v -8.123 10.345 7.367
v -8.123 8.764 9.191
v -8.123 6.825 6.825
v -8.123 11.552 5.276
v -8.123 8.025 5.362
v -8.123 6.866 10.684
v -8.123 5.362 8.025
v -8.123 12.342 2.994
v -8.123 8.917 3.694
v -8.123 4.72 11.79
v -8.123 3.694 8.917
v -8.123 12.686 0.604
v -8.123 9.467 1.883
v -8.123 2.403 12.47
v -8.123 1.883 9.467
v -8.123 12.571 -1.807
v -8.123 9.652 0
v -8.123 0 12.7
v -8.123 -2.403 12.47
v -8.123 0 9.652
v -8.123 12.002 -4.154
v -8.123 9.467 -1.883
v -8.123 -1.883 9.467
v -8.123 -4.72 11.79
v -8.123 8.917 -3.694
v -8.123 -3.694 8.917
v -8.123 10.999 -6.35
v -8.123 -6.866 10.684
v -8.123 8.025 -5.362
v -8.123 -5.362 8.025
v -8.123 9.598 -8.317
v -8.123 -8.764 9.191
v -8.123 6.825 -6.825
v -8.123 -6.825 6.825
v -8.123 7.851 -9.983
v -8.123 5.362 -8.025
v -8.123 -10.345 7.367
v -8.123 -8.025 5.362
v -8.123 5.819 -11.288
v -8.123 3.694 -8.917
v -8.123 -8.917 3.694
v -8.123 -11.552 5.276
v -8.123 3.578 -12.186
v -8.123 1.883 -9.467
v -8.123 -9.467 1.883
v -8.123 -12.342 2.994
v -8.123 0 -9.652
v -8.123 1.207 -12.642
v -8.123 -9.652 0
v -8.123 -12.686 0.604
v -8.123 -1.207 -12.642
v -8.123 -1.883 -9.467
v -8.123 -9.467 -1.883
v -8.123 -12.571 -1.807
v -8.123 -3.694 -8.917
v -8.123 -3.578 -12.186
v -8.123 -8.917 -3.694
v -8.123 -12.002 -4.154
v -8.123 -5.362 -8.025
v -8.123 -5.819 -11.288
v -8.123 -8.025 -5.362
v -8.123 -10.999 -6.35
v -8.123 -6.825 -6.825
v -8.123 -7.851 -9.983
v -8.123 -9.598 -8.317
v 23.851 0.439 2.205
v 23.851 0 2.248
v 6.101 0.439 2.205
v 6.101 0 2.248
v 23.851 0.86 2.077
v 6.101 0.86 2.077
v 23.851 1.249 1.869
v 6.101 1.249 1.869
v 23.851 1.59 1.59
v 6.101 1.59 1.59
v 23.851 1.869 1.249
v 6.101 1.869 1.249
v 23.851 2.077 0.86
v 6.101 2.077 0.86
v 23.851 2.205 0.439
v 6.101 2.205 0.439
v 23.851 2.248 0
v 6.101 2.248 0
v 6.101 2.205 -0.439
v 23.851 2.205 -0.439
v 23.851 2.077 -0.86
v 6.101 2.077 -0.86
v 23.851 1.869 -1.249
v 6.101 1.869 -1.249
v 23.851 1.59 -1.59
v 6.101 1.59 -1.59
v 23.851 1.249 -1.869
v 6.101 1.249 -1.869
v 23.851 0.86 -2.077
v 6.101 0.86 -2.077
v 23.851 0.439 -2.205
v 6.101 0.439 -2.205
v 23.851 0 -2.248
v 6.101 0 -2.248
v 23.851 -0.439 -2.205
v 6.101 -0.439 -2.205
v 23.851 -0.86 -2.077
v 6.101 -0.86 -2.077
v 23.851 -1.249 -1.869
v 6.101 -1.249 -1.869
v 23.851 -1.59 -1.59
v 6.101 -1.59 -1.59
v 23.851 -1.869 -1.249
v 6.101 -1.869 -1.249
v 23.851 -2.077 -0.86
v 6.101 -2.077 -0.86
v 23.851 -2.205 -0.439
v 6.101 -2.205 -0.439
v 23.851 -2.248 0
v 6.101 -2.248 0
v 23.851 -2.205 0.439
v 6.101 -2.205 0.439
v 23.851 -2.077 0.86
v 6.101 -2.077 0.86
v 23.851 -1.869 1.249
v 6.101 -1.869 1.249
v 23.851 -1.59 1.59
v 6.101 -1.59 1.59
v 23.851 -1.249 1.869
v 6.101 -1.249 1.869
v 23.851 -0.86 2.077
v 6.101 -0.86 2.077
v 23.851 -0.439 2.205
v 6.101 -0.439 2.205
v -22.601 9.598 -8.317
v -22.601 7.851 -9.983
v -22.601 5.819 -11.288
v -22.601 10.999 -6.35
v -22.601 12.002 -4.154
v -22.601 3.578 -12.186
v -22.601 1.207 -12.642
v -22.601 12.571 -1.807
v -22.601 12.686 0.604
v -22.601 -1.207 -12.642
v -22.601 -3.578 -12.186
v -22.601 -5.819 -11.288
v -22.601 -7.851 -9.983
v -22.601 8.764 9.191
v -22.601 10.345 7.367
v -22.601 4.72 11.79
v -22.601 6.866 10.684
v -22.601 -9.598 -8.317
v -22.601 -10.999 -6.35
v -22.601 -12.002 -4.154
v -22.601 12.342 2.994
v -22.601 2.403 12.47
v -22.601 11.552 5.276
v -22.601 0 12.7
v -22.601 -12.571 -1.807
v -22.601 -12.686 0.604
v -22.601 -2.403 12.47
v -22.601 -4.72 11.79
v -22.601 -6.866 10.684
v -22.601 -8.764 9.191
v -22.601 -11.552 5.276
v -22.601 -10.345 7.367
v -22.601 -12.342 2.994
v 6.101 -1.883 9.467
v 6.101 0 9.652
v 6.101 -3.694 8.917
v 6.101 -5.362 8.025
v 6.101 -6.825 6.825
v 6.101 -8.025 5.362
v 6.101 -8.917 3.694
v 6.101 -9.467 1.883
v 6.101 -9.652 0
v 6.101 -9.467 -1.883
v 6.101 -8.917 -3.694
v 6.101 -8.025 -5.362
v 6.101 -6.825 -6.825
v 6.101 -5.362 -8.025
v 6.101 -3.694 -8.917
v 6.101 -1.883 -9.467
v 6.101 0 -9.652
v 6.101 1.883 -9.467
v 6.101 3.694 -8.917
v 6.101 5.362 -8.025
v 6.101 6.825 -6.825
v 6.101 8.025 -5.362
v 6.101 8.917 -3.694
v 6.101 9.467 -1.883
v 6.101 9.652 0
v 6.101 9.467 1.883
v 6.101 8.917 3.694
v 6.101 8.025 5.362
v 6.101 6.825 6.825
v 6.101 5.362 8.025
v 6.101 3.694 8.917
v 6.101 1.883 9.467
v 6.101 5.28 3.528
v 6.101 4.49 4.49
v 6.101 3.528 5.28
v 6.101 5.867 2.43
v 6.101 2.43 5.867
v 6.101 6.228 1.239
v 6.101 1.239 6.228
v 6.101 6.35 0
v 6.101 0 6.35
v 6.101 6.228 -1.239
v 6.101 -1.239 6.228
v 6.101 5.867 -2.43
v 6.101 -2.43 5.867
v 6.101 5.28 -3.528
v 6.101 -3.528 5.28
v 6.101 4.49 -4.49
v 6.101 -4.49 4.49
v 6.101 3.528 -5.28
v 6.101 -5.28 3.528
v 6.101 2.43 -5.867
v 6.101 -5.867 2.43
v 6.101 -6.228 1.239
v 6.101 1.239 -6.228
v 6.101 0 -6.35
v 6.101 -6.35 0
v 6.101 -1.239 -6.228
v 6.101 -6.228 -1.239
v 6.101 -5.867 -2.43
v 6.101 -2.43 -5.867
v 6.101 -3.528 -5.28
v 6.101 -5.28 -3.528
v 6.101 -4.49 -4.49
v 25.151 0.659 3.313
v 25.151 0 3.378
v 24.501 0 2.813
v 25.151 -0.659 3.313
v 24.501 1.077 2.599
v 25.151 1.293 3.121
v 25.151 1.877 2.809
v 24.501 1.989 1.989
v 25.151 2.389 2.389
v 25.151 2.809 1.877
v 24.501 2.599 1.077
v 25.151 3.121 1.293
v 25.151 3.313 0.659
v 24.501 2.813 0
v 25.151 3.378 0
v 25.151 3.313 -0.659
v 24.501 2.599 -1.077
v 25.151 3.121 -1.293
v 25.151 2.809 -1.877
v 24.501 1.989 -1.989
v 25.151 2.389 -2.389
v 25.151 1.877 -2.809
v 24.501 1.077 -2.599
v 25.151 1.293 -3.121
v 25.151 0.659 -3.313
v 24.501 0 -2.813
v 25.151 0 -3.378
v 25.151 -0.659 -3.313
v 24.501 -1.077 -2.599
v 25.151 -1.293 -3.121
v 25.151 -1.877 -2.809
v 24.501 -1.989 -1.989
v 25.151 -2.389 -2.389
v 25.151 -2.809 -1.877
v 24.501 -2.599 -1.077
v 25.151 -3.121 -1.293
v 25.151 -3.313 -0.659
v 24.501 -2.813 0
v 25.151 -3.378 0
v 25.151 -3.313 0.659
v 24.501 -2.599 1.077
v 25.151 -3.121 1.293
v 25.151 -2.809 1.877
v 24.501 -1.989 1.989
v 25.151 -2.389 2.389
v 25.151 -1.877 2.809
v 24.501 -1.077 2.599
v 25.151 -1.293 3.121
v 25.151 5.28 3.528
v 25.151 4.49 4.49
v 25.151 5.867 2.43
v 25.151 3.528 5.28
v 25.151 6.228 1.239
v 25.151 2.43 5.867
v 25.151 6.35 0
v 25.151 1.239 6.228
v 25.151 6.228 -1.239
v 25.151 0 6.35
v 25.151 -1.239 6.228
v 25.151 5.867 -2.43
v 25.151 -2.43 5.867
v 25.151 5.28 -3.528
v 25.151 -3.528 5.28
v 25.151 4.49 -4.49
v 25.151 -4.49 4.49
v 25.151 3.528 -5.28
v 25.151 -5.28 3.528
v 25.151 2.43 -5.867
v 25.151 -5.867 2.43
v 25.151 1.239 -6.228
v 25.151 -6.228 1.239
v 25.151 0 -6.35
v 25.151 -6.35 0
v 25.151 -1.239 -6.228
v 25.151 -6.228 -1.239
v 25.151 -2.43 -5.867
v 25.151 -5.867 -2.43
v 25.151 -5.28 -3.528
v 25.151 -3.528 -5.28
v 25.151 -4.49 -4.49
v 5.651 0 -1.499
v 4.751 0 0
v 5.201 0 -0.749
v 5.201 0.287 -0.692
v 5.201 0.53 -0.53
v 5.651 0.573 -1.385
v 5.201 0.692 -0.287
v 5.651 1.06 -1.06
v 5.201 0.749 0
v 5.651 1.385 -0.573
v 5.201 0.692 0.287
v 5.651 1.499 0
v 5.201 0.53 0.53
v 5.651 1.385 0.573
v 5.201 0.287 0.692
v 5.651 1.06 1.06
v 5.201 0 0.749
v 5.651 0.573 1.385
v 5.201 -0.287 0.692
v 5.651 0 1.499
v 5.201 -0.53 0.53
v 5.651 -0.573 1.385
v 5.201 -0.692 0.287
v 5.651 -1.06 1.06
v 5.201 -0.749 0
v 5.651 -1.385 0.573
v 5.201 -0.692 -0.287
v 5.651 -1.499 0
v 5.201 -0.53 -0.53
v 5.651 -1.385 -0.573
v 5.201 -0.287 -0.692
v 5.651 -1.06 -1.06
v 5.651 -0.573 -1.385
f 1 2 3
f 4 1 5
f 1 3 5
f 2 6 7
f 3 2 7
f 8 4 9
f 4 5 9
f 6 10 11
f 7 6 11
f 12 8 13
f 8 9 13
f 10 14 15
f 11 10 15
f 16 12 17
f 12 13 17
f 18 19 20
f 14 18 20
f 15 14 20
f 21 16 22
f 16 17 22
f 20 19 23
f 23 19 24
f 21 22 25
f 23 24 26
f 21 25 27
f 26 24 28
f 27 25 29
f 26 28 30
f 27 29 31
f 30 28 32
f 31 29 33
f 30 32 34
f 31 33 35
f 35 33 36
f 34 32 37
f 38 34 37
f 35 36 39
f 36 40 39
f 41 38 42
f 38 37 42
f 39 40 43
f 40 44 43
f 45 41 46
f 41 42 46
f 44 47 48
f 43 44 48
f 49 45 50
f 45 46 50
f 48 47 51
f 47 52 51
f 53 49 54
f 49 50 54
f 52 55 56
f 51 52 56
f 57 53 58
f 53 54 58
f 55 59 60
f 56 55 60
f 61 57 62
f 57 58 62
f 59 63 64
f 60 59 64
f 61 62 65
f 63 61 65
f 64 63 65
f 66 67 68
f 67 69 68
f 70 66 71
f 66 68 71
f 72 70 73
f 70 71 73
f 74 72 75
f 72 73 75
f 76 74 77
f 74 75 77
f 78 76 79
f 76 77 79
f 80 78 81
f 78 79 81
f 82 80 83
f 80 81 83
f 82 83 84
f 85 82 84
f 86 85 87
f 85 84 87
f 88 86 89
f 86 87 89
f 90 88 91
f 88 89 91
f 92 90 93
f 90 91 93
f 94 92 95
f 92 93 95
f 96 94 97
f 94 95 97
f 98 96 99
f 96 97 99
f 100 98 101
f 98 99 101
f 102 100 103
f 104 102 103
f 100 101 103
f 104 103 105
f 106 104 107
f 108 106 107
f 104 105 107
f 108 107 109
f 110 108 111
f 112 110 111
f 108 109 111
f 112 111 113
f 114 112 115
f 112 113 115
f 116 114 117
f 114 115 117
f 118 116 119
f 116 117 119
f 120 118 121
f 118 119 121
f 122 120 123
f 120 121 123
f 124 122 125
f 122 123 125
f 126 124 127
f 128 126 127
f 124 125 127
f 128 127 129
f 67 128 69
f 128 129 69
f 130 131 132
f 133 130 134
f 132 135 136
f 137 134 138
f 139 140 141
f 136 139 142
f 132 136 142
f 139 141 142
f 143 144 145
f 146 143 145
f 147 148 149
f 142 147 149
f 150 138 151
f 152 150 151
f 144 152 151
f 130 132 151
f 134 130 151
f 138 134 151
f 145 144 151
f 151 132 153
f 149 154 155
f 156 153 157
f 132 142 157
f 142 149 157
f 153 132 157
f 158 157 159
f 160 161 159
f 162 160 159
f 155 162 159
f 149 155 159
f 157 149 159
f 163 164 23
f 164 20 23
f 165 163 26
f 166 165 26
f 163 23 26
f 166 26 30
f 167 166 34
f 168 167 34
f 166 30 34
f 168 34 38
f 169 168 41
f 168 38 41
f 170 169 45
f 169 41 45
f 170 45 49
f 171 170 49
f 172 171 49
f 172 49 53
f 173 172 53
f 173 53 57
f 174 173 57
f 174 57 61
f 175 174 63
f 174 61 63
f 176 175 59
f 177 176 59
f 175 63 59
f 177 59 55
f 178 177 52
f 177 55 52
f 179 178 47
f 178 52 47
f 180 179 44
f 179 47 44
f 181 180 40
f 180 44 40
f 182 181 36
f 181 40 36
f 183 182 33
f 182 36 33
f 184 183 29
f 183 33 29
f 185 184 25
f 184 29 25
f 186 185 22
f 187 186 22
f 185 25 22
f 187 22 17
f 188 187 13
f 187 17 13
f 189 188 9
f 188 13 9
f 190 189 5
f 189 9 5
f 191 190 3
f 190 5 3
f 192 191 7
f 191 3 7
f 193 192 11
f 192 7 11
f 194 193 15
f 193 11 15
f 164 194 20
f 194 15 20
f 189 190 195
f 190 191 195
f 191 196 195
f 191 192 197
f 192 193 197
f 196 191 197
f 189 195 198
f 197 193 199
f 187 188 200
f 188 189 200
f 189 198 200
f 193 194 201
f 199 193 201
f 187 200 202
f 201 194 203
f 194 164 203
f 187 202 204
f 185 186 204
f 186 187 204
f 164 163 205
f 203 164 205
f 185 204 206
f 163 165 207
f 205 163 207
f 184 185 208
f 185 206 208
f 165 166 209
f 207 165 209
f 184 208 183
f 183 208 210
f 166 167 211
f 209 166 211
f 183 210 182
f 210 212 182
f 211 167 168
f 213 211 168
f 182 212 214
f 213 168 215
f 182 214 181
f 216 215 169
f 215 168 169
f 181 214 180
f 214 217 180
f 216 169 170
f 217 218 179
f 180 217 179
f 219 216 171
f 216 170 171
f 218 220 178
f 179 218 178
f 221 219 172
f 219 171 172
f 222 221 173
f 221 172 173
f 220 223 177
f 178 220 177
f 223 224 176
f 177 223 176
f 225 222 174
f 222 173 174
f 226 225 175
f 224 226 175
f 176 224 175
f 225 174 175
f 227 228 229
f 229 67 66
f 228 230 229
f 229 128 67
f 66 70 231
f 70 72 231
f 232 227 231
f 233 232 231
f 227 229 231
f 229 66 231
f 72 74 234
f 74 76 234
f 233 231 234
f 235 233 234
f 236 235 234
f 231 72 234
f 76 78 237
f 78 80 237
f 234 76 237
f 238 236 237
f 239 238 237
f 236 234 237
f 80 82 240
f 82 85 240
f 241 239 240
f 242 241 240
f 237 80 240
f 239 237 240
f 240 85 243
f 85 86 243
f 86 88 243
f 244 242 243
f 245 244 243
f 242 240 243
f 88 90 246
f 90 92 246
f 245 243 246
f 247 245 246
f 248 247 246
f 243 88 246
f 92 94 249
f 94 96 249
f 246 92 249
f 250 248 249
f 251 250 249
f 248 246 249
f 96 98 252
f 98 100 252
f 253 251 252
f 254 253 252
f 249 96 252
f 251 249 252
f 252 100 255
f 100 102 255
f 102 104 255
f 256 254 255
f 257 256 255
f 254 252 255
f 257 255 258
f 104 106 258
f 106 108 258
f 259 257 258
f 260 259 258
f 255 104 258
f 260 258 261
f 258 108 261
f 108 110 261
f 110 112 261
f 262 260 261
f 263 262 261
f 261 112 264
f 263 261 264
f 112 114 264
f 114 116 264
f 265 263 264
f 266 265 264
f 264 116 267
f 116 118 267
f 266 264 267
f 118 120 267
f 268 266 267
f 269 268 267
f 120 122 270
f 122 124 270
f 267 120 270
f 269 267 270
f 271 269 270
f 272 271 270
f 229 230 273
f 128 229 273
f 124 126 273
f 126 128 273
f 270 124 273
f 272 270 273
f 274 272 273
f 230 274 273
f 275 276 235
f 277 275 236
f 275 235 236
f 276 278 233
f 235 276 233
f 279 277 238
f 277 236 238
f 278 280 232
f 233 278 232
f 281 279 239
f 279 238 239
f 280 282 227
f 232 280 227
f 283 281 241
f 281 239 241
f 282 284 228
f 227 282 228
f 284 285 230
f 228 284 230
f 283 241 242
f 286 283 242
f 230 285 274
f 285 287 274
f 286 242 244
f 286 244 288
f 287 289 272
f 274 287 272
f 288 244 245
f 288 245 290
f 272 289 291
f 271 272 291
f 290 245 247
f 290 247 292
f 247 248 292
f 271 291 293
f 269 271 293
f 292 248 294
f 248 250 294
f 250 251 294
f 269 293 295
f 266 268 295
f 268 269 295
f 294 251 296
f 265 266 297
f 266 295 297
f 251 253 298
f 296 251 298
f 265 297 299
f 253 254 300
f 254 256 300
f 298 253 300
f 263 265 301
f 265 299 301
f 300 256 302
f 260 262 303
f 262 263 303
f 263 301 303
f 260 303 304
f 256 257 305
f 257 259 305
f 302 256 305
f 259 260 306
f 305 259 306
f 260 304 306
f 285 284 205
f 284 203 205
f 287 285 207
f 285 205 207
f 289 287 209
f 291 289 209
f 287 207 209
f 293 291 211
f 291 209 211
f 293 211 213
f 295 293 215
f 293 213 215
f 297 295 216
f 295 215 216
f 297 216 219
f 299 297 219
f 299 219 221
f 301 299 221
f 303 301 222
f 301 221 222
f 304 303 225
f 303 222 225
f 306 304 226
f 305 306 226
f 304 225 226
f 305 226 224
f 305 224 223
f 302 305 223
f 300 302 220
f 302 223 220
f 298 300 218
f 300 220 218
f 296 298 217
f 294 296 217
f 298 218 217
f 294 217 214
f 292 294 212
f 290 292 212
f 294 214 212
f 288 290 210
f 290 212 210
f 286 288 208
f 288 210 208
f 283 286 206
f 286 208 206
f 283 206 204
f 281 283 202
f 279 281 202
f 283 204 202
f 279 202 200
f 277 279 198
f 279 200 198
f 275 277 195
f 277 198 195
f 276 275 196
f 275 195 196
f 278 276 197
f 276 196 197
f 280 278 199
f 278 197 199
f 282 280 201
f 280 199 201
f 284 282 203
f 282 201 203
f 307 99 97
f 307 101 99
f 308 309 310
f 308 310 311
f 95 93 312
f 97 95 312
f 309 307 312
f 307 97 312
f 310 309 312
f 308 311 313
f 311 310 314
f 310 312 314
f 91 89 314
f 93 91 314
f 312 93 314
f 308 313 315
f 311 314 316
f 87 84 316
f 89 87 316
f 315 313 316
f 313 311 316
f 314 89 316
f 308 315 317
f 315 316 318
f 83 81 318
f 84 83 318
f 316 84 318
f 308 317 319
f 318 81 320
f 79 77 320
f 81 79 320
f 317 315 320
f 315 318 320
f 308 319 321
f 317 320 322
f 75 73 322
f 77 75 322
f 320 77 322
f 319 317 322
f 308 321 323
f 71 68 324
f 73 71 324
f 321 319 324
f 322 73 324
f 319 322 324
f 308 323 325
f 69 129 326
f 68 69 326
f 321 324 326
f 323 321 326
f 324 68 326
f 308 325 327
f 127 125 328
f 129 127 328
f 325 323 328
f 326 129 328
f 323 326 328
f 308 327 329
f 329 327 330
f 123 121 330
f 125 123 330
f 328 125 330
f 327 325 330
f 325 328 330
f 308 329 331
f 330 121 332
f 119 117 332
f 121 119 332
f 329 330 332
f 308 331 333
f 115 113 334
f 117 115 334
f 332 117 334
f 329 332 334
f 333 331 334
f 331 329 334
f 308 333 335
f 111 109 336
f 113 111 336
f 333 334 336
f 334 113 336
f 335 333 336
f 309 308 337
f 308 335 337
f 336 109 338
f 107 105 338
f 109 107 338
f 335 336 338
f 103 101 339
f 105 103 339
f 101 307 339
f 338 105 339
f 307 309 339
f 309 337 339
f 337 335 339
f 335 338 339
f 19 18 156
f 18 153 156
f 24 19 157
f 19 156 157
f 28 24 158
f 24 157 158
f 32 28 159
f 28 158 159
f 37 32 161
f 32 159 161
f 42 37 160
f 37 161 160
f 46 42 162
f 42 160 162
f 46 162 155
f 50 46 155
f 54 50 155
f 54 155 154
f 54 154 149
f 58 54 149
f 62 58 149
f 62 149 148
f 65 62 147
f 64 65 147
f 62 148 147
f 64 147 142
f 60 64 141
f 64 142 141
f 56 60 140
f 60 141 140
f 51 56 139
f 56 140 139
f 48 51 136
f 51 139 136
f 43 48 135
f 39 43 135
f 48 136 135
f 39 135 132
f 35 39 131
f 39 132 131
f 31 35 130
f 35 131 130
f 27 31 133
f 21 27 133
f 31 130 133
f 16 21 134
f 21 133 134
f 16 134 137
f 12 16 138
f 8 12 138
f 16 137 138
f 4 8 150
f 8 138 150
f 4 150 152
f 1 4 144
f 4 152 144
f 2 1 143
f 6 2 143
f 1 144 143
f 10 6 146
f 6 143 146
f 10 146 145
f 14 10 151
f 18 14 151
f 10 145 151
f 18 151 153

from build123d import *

# Parameters (mm, degrees)
F_12_24_TAPPED_HOLE1_D           = 4.4958
F_12_24_TAPPED_HOLE1_DEPTH       = 19.05
F_12_24_TAPPED_HOLE1_CSINK_D     = 6.7564
F_12_24_TAPPED_HOLE1_CSINK_ANGLE = 82
F_12_24_TAPPED_HOLE1_TIP         = 1.350674586


with BuildPart() as part:
    # Sketch3 → Revolve1 (revolve)
    with BuildSketch(Plane(origin=(0, 0, 0), x_dir=(1, 0, 0), z_dir=(0, 1, 0)), mode=Mode.PRIVATE) as revolve1_sk:
        Polygon((-22.600524836, 0), (25.151475164, 0), (25.151475164, 6.35), (6.101475164, 6.35), (6.101475164, 9.652), (-8.122524836, 9.652), (-8.122524836, 12.7), (-22.600524836, 12.7), align=None)
    revolve(revolve1_sk.sketch.rotate(Axis((-22.600524836, 0, 0), (1, 0, 0)), 180), axis=Axis((-22.600524836, 0, 0), (1, 0, 0)))

    # #12-24 Tapped Hole1
    with Locations(Plane(origin=(25.151475164, 0, 0), x_dir=(0, 0, -1), z_dir=(1, 0, 0))):
        with Locations((0, 0)):
            CounterSinkHole(F_12_24_TAPPED_HOLE1_D / 2, F_12_24_TAPPED_HOLE1_CSINK_D / 2, depth=F_12_24_TAPPED_HOLE1_DEPTH, counter_sink_angle=F_12_24_TAPPED_HOLE1_CSINK_ANGLE)
            with Locations((0, 0, -(F_12_24_TAPPED_HOLE1_DEPTH + F_12_24_TAPPED_HOLE1_TIP / 2))):  # 118° drill point
                Cone(0, F_12_24_TAPPED_HOLE1_D / 2, F_12_24_TAPPED_HOLE1_TIP, mode=Mode.SUBTRACT)


solid = part.part
